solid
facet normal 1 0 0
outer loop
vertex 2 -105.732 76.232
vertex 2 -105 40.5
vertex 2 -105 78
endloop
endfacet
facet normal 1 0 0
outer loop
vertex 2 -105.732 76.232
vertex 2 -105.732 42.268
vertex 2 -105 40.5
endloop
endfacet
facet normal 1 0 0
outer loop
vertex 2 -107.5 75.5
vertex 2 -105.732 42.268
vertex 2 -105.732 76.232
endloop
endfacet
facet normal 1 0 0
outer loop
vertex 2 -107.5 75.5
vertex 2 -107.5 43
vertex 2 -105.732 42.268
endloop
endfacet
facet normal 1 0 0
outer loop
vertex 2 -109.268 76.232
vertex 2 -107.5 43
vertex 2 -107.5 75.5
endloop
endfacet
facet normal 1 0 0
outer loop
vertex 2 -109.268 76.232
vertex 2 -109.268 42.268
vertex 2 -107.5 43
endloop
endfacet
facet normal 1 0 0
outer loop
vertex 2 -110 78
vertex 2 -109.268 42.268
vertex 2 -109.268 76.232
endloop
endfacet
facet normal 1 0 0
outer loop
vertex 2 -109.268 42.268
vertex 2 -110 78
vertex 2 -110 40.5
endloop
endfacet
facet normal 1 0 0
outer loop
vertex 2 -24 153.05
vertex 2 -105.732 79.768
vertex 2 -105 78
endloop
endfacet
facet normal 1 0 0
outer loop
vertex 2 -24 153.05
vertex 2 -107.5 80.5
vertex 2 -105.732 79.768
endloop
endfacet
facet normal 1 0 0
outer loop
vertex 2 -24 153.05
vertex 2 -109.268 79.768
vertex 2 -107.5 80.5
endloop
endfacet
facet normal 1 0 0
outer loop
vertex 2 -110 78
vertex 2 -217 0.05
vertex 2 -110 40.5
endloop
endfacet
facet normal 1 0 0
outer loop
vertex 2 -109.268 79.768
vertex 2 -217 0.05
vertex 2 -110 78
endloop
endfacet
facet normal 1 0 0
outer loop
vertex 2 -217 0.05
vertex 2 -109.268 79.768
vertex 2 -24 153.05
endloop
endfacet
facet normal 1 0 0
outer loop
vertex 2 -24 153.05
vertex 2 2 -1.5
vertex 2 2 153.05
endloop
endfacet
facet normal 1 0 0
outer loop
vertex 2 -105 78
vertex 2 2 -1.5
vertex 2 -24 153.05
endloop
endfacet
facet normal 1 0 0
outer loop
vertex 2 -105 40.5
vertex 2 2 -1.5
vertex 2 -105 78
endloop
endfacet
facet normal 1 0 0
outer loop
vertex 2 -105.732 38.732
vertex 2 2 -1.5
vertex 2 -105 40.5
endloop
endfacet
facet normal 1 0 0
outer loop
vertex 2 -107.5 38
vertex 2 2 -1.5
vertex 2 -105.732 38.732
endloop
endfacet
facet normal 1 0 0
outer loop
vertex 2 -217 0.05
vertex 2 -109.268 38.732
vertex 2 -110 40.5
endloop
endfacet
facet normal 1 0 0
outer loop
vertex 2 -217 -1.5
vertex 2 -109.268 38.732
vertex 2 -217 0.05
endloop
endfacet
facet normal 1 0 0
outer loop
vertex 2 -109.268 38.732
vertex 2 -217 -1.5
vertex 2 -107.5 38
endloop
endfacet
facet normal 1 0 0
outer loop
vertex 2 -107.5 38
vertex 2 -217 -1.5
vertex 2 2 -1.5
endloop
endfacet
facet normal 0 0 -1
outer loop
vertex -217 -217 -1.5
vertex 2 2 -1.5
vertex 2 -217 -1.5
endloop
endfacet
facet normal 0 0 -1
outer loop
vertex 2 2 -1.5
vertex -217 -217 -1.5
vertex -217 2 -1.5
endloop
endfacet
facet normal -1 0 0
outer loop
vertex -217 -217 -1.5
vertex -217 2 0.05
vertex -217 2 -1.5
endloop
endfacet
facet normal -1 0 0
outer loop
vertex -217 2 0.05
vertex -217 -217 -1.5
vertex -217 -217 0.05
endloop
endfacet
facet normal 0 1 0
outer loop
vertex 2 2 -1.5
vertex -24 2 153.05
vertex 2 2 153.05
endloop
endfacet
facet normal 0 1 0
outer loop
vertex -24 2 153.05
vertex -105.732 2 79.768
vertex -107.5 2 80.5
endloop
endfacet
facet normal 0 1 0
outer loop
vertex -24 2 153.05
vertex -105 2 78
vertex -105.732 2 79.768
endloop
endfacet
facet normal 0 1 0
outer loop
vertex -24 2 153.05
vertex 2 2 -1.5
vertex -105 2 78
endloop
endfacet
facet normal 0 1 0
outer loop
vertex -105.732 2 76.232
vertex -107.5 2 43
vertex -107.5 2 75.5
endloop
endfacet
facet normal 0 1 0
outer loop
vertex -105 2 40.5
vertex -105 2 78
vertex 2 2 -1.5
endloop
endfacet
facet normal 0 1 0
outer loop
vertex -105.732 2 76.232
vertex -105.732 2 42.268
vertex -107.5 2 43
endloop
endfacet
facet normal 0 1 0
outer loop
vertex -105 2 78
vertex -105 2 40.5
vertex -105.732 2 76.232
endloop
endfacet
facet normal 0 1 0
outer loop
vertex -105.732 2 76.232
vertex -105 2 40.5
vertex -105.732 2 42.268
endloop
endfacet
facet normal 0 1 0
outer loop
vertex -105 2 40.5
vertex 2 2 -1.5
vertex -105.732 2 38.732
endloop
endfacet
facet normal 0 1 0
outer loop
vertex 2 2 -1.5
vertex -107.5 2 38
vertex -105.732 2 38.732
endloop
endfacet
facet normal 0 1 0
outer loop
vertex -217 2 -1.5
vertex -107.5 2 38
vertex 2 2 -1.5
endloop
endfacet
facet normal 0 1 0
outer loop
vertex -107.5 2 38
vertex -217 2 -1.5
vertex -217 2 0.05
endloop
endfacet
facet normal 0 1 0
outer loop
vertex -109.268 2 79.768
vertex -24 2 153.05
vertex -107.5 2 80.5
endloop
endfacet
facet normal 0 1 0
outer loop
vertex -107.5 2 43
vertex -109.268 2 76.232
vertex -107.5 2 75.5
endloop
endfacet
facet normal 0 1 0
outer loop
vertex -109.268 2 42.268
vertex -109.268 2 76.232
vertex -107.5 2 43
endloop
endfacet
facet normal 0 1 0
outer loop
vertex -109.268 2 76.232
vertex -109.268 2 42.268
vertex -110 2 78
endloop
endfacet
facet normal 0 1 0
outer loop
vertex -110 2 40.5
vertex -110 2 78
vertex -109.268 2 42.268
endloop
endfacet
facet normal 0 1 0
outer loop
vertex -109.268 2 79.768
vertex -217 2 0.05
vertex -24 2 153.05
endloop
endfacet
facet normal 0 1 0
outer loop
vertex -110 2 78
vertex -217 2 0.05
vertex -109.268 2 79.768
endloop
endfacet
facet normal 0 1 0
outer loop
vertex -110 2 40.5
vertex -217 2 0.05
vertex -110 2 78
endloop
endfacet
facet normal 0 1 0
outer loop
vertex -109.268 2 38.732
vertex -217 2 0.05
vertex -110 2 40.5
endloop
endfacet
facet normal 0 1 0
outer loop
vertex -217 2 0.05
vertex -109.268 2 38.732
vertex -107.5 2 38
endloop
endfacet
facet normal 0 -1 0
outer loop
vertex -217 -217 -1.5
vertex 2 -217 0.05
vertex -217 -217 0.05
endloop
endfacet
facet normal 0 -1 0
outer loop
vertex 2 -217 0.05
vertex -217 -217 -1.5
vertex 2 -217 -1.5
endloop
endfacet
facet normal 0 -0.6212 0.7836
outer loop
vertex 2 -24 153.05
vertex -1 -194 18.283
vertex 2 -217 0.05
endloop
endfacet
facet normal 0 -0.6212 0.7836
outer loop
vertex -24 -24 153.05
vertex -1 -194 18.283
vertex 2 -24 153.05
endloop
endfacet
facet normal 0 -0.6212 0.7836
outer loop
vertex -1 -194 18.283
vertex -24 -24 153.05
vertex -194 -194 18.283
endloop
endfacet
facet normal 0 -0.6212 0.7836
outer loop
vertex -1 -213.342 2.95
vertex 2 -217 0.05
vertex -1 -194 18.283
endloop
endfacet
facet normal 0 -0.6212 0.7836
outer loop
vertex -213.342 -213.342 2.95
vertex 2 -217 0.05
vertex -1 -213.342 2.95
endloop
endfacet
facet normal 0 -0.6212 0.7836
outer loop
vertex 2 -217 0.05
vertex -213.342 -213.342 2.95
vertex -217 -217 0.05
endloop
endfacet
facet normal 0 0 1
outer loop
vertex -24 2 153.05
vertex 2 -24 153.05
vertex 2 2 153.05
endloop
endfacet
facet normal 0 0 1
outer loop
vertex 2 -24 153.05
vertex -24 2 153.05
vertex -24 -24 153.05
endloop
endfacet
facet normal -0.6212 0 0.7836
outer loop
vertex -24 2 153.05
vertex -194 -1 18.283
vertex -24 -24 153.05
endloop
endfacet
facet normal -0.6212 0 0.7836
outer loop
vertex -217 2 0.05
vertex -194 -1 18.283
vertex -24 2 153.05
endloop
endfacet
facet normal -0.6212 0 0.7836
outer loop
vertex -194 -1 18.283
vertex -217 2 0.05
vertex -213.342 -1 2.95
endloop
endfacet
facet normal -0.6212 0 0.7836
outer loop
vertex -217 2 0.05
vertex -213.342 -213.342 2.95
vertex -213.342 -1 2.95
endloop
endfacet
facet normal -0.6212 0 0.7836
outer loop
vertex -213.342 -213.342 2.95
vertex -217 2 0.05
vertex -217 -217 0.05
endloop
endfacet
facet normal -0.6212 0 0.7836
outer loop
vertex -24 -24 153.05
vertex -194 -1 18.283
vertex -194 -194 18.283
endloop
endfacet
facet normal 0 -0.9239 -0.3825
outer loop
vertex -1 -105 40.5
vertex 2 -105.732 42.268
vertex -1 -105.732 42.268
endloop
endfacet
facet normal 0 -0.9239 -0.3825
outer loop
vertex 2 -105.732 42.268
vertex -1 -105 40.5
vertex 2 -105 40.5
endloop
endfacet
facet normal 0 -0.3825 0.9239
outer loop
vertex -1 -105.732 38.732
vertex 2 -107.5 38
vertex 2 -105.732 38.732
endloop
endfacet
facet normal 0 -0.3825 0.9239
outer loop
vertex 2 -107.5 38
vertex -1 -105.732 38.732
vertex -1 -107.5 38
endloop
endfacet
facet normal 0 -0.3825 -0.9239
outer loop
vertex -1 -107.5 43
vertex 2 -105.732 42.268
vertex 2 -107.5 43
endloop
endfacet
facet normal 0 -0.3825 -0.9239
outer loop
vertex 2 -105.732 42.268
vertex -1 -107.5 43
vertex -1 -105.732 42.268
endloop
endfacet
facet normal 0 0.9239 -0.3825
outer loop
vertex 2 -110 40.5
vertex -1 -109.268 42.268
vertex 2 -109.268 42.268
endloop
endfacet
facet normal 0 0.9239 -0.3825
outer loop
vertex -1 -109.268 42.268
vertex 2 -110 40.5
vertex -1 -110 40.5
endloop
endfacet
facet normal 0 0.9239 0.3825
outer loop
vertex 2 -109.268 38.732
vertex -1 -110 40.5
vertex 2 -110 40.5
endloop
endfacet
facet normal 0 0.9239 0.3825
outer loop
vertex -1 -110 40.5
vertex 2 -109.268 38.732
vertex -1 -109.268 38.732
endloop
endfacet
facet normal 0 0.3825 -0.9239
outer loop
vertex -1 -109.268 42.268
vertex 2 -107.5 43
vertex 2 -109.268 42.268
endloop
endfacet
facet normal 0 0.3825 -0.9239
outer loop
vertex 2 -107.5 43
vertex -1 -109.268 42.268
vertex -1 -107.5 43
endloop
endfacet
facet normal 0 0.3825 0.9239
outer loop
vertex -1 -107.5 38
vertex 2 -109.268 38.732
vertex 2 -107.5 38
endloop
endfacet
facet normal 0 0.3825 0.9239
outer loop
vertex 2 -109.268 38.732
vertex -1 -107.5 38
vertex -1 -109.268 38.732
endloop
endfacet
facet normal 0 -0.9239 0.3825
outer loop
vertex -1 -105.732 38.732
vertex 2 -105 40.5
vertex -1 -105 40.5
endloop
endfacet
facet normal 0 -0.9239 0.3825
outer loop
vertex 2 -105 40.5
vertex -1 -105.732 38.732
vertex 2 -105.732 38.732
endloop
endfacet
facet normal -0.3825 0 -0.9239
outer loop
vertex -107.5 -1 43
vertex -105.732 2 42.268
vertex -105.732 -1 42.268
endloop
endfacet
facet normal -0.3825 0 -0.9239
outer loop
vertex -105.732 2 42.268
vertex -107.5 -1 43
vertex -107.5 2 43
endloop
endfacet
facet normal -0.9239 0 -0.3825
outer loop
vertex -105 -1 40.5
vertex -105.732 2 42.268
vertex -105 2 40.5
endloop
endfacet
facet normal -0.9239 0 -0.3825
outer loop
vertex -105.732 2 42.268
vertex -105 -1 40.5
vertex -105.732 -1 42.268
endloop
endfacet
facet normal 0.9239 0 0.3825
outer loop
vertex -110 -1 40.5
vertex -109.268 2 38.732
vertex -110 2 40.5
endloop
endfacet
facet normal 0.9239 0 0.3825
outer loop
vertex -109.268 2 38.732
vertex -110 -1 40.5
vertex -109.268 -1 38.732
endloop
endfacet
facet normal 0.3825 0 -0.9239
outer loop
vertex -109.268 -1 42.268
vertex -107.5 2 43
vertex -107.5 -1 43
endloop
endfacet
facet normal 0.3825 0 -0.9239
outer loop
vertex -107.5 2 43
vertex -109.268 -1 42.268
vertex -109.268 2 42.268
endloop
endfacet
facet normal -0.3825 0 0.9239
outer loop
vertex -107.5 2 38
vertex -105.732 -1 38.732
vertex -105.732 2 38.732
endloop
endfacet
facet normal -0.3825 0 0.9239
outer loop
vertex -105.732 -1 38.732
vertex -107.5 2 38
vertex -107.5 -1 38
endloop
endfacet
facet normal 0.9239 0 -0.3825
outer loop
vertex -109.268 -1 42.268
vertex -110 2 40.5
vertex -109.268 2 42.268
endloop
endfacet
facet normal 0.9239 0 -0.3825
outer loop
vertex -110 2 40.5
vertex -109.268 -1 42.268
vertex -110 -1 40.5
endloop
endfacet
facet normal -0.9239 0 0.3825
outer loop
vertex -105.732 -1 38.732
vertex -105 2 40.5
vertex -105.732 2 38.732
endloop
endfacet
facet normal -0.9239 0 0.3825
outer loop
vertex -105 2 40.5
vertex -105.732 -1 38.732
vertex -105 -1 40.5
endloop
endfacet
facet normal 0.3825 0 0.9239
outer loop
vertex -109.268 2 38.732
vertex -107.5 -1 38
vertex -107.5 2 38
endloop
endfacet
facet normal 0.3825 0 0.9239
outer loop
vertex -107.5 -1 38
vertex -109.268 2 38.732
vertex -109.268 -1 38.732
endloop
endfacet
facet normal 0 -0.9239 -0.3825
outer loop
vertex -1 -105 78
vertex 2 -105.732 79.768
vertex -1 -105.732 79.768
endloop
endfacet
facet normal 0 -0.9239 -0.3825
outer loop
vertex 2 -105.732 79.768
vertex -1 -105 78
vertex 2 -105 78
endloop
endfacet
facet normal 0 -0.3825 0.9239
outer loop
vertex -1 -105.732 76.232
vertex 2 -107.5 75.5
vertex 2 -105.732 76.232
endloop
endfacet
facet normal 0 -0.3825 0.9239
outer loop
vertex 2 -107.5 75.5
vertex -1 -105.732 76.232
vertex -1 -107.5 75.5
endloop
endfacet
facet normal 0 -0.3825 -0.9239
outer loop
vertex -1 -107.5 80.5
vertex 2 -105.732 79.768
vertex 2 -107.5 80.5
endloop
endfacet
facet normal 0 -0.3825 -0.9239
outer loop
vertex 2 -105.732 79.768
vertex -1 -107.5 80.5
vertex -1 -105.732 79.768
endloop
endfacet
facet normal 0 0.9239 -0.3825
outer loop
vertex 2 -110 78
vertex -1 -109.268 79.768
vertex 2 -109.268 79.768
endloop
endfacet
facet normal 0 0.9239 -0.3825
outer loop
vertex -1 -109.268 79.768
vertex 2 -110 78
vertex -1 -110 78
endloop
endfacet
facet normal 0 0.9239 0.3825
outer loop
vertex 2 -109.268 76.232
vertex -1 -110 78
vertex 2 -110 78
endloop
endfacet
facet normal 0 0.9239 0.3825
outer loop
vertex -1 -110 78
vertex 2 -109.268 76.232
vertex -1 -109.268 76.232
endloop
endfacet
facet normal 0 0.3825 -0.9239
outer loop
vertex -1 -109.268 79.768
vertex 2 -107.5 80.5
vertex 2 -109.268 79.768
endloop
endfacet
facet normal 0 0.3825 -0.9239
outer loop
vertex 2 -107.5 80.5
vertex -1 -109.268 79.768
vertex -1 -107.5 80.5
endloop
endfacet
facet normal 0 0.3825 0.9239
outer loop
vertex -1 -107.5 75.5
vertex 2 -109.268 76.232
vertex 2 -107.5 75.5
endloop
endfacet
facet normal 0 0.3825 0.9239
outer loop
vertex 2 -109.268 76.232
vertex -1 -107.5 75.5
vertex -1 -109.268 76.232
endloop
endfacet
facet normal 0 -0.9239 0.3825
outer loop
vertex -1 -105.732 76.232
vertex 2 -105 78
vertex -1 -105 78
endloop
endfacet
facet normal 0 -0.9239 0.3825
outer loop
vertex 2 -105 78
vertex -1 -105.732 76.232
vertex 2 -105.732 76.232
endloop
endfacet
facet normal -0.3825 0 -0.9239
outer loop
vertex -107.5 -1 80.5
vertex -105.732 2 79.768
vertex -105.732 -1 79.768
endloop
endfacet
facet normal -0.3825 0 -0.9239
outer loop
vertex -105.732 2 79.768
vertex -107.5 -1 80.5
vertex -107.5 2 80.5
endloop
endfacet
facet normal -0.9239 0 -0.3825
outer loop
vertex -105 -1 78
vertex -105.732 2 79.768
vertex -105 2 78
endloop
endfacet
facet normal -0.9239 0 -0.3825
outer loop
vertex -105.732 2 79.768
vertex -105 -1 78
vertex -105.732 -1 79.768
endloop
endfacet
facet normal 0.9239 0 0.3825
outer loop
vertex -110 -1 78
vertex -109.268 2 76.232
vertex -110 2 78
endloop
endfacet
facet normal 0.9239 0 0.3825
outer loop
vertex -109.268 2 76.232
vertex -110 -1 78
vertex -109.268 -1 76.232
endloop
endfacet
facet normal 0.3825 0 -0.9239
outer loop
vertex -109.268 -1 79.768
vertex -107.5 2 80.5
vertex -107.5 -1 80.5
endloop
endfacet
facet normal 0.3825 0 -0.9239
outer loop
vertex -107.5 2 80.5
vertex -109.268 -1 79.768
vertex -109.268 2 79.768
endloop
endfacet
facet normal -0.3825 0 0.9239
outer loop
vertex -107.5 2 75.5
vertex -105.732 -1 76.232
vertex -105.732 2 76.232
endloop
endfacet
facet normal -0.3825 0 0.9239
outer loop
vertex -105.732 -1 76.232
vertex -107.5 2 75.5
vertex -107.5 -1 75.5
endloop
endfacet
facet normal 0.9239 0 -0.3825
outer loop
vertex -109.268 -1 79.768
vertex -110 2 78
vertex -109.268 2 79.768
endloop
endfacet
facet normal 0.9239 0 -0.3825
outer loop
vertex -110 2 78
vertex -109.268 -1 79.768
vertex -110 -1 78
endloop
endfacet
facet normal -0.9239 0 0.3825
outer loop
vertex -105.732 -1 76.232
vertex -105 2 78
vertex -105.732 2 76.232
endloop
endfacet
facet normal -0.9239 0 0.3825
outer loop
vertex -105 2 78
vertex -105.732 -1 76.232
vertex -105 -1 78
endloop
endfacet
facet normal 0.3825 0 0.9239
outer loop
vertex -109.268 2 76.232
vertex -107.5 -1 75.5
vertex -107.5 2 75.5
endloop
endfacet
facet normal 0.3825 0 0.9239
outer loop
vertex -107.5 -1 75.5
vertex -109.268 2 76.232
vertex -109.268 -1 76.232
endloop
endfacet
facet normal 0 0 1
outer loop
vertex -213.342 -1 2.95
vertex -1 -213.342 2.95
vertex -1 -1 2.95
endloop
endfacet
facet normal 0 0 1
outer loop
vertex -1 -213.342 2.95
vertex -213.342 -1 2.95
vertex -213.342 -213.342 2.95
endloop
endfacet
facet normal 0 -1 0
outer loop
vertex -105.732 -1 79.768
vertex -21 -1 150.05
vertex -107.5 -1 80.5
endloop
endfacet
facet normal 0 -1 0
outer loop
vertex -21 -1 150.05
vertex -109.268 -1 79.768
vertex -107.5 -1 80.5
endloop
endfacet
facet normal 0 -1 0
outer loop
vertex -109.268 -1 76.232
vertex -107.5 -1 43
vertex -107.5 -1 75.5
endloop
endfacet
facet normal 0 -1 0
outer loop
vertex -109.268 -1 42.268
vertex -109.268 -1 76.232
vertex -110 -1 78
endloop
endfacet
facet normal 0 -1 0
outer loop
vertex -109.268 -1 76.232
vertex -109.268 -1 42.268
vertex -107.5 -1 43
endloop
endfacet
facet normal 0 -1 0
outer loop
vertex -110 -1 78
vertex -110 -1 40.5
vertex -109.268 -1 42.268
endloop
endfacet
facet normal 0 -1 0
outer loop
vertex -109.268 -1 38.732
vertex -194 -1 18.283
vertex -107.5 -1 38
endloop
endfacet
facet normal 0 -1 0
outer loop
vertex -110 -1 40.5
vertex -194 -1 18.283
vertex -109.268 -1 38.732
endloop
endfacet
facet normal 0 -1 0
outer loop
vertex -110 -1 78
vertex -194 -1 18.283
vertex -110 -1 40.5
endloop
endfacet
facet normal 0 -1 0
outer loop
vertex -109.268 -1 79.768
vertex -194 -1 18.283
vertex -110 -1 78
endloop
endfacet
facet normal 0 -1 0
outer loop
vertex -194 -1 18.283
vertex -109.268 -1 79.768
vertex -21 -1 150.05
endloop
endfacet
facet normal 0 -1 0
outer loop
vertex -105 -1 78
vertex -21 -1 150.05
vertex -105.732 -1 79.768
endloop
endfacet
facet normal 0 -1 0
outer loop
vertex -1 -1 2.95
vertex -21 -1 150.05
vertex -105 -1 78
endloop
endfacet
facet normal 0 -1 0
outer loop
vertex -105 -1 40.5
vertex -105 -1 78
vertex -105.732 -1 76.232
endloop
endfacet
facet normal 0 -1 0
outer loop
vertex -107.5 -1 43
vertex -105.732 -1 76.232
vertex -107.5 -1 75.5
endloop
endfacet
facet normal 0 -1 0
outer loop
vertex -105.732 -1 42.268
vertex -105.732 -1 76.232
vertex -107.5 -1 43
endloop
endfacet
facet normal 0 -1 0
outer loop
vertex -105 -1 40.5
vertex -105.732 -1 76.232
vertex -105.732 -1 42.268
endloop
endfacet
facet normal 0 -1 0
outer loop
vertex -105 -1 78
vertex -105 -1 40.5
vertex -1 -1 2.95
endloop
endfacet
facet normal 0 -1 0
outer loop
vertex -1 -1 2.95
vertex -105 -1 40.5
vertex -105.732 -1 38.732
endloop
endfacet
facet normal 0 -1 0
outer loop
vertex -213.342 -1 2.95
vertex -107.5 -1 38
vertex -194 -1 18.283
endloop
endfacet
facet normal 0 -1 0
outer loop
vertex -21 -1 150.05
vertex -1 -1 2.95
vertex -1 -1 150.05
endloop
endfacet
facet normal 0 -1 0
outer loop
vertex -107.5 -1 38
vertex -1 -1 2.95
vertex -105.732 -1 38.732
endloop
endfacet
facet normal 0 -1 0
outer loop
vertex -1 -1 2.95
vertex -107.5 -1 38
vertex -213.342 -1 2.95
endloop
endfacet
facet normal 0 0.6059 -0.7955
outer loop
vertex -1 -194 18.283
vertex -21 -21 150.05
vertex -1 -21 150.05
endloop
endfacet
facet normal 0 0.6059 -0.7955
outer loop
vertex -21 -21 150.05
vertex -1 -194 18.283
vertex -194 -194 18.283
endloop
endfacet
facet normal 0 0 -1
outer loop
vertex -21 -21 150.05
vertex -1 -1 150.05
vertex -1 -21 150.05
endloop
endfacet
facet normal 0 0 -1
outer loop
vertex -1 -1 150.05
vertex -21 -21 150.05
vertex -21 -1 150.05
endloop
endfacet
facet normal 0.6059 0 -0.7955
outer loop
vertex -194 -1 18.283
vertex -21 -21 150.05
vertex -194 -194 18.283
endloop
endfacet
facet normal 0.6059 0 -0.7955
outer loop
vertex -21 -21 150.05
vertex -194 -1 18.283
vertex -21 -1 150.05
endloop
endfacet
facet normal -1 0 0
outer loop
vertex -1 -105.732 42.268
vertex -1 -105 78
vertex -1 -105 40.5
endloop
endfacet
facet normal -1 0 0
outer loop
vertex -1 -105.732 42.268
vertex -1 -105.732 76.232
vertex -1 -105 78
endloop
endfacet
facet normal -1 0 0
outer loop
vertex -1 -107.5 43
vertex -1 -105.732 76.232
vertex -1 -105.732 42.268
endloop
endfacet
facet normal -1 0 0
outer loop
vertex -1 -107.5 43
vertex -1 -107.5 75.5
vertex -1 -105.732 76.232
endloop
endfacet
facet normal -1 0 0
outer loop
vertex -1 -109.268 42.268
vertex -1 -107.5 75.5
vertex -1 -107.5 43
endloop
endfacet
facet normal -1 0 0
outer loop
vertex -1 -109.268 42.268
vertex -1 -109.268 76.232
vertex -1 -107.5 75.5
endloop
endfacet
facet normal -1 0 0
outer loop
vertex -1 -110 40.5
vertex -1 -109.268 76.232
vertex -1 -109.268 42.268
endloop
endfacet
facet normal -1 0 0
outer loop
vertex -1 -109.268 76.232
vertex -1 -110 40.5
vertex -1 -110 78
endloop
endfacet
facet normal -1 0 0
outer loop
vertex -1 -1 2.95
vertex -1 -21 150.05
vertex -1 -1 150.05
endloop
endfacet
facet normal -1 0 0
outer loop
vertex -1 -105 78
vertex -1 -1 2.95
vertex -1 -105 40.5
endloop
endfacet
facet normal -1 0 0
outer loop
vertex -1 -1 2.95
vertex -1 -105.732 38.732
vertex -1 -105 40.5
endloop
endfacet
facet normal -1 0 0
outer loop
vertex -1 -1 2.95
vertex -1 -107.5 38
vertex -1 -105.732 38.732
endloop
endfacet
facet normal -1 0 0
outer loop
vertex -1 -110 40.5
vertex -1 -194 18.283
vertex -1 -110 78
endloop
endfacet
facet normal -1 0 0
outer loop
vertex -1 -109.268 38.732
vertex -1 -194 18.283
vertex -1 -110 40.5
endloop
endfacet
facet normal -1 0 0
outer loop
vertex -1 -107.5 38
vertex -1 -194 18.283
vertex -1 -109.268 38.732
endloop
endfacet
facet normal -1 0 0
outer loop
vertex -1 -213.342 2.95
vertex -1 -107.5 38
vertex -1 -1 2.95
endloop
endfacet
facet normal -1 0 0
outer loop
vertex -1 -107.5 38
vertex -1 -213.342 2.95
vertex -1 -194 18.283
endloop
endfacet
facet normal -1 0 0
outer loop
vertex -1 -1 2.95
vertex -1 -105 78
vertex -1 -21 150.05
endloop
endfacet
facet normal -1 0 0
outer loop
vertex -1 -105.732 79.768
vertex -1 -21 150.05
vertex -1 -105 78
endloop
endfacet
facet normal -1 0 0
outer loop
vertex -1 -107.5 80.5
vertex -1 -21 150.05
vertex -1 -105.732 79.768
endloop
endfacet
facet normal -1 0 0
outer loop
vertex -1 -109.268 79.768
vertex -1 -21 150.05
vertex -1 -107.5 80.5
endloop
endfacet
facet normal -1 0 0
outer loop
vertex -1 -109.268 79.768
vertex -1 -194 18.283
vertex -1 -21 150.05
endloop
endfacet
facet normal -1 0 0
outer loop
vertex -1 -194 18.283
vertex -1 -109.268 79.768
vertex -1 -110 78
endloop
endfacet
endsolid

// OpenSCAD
difference() {
	union() {
		difference() {
			translate(v = [-107.5, -107.5, 0]) {
				cube(center = true, size = [219.0, 219.0, 3]);
			}
			translate(v = [-107.5, -107.5, 1.5]) {
				cube(center = true, size = [219.0, 219.0, 3.1]);
			}
		}
		hull() {
			translate(v = [-107.5, -107.5, 0]) {
				cube(center = true, size = [219.0, 219.0, 0.1]);
			}
			translate(v = [-11.0, -11.0, 153]) {
				cube(center = true, size = [26.0, 26.0, 0.1]);
			}
		}
	}
	hull() {
		translate(v = [-107.5, -107.5, 3]) {
			cube(center = true, size = [213.0, 213.0, 0.1]);
		}
		translate(v = [-11.0, -11.0, 150]) {
			cube(center = true, size = [20.0, 20.0, 0.1]);
		}
	}
	union() {
		translate(v = [0, -107.5, 40.5]) {
			rotate(a = [0, 90, 0]) {
				cylinder(center = true, h = 30, r = 2.5);
			}
		}
		translate(v = [-107.5, 0, 40.5]) {
			rotate(a = [90, 0, 0]) {
				cylinder(center = true, h = 30, r = 2.5);
			}
		}
		translate(v = [0, -107.5, 78.0]) {
			rotate(a = [0, 90, 0]) {
				cylinder(center = true, h = 30, r = 2.5);
			}
		}
		translate(v = [-107.5, 0, 78.0]) {
			rotate(a = [90, 0, 0]) {
				cylinder(center = true, h = 30, r = 2.5);
			}
		}
		translate(v = [0, -107.5, 115.5]) {
			rotate(a = [0, 90, 0]) {
				cylinder(center = true, h = 30, r = 2.5);
			}
		}
		translate(v = [-107.5, 0, 115.5]) {
			rotate(a = [90, 0, 0]) {
				cylinder(center = true, h = 30, r = 2.5);
			}
		}
	}
}
